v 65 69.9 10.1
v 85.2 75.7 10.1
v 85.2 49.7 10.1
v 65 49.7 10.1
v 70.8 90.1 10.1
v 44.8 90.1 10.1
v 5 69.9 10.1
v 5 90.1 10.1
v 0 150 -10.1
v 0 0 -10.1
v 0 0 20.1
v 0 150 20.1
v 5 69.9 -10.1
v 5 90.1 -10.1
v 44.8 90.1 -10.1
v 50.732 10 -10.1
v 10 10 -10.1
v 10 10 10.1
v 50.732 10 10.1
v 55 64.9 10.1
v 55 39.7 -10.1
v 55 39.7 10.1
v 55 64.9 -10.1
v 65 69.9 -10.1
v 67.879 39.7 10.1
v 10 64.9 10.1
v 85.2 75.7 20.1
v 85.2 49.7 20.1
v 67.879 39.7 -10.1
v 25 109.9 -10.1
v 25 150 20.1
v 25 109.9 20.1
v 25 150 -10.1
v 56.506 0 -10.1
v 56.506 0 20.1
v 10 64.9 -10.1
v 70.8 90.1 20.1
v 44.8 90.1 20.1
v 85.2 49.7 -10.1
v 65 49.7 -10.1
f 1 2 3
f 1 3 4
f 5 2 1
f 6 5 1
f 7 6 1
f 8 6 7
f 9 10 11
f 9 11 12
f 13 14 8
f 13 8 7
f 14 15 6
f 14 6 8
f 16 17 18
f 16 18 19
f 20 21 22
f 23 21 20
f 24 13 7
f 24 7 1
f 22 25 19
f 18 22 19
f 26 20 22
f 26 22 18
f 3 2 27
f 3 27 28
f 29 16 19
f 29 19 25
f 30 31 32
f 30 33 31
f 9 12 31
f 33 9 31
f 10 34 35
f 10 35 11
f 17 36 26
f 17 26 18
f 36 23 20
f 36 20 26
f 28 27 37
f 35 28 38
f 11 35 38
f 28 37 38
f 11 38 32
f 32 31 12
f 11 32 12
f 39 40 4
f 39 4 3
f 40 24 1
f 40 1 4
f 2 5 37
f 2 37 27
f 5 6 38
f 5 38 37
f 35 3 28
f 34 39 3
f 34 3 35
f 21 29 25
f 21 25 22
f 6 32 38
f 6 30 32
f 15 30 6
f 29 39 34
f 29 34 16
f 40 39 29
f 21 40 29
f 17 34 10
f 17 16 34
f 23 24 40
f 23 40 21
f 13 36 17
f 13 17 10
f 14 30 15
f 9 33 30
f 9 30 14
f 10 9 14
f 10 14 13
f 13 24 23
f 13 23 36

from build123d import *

# Parameters (mm, degrees)
BOSS_EXTRUDE1_DEPTH      = 10.1
BOSS_EXTRUDE1_DEPTH_BACK = 10.1
BOSS_EXTRUDE2_DEPTH      = 10


with BuildPart() as part:
    # Sketch1 → Boss-Extrude1 (new, two sides: drawn at the far end of the back side and taken through both)
    with BuildSketch(Plane.XY.offset(-BOSS_EXTRUDE1_DEPTH_BACK)):
        Polygon((0, 0), (0, 150), (25, 150), (25, 109.9), (44.8, 90.1), (5, 90.1), (5, 69.9), (65, 69.9), (65, 49.7), (85.2, 49.7), (56.505691621, 0), align=None)
        Polygon((10, 64.9), (10, 10), (50.732188929, 10), (67.879491924, 39.7), (55, 39.7), (55, 64.9), align=None, mode=Mode.SUBTRACT)
    extrude(amount=BOSS_EXTRUDE1_DEPTH + BOSS_EXTRUDE1_DEPTH_BACK)

    # Sketch2 → Boss-Extrude2 (add)
    with BuildSketch(Plane.XY.offset(10.1)):
        Polygon((44.8, 90.1), (70.8, 90.1), (85.2, 75.7), (85.2, 49.7), (56.505691621, 0), (0, 0), (0, 150), (25, 150), (25, 109.9), align=None)
    extrude(amount=BOSS_EXTRUDE2_DEPTH)


solid = part.part
